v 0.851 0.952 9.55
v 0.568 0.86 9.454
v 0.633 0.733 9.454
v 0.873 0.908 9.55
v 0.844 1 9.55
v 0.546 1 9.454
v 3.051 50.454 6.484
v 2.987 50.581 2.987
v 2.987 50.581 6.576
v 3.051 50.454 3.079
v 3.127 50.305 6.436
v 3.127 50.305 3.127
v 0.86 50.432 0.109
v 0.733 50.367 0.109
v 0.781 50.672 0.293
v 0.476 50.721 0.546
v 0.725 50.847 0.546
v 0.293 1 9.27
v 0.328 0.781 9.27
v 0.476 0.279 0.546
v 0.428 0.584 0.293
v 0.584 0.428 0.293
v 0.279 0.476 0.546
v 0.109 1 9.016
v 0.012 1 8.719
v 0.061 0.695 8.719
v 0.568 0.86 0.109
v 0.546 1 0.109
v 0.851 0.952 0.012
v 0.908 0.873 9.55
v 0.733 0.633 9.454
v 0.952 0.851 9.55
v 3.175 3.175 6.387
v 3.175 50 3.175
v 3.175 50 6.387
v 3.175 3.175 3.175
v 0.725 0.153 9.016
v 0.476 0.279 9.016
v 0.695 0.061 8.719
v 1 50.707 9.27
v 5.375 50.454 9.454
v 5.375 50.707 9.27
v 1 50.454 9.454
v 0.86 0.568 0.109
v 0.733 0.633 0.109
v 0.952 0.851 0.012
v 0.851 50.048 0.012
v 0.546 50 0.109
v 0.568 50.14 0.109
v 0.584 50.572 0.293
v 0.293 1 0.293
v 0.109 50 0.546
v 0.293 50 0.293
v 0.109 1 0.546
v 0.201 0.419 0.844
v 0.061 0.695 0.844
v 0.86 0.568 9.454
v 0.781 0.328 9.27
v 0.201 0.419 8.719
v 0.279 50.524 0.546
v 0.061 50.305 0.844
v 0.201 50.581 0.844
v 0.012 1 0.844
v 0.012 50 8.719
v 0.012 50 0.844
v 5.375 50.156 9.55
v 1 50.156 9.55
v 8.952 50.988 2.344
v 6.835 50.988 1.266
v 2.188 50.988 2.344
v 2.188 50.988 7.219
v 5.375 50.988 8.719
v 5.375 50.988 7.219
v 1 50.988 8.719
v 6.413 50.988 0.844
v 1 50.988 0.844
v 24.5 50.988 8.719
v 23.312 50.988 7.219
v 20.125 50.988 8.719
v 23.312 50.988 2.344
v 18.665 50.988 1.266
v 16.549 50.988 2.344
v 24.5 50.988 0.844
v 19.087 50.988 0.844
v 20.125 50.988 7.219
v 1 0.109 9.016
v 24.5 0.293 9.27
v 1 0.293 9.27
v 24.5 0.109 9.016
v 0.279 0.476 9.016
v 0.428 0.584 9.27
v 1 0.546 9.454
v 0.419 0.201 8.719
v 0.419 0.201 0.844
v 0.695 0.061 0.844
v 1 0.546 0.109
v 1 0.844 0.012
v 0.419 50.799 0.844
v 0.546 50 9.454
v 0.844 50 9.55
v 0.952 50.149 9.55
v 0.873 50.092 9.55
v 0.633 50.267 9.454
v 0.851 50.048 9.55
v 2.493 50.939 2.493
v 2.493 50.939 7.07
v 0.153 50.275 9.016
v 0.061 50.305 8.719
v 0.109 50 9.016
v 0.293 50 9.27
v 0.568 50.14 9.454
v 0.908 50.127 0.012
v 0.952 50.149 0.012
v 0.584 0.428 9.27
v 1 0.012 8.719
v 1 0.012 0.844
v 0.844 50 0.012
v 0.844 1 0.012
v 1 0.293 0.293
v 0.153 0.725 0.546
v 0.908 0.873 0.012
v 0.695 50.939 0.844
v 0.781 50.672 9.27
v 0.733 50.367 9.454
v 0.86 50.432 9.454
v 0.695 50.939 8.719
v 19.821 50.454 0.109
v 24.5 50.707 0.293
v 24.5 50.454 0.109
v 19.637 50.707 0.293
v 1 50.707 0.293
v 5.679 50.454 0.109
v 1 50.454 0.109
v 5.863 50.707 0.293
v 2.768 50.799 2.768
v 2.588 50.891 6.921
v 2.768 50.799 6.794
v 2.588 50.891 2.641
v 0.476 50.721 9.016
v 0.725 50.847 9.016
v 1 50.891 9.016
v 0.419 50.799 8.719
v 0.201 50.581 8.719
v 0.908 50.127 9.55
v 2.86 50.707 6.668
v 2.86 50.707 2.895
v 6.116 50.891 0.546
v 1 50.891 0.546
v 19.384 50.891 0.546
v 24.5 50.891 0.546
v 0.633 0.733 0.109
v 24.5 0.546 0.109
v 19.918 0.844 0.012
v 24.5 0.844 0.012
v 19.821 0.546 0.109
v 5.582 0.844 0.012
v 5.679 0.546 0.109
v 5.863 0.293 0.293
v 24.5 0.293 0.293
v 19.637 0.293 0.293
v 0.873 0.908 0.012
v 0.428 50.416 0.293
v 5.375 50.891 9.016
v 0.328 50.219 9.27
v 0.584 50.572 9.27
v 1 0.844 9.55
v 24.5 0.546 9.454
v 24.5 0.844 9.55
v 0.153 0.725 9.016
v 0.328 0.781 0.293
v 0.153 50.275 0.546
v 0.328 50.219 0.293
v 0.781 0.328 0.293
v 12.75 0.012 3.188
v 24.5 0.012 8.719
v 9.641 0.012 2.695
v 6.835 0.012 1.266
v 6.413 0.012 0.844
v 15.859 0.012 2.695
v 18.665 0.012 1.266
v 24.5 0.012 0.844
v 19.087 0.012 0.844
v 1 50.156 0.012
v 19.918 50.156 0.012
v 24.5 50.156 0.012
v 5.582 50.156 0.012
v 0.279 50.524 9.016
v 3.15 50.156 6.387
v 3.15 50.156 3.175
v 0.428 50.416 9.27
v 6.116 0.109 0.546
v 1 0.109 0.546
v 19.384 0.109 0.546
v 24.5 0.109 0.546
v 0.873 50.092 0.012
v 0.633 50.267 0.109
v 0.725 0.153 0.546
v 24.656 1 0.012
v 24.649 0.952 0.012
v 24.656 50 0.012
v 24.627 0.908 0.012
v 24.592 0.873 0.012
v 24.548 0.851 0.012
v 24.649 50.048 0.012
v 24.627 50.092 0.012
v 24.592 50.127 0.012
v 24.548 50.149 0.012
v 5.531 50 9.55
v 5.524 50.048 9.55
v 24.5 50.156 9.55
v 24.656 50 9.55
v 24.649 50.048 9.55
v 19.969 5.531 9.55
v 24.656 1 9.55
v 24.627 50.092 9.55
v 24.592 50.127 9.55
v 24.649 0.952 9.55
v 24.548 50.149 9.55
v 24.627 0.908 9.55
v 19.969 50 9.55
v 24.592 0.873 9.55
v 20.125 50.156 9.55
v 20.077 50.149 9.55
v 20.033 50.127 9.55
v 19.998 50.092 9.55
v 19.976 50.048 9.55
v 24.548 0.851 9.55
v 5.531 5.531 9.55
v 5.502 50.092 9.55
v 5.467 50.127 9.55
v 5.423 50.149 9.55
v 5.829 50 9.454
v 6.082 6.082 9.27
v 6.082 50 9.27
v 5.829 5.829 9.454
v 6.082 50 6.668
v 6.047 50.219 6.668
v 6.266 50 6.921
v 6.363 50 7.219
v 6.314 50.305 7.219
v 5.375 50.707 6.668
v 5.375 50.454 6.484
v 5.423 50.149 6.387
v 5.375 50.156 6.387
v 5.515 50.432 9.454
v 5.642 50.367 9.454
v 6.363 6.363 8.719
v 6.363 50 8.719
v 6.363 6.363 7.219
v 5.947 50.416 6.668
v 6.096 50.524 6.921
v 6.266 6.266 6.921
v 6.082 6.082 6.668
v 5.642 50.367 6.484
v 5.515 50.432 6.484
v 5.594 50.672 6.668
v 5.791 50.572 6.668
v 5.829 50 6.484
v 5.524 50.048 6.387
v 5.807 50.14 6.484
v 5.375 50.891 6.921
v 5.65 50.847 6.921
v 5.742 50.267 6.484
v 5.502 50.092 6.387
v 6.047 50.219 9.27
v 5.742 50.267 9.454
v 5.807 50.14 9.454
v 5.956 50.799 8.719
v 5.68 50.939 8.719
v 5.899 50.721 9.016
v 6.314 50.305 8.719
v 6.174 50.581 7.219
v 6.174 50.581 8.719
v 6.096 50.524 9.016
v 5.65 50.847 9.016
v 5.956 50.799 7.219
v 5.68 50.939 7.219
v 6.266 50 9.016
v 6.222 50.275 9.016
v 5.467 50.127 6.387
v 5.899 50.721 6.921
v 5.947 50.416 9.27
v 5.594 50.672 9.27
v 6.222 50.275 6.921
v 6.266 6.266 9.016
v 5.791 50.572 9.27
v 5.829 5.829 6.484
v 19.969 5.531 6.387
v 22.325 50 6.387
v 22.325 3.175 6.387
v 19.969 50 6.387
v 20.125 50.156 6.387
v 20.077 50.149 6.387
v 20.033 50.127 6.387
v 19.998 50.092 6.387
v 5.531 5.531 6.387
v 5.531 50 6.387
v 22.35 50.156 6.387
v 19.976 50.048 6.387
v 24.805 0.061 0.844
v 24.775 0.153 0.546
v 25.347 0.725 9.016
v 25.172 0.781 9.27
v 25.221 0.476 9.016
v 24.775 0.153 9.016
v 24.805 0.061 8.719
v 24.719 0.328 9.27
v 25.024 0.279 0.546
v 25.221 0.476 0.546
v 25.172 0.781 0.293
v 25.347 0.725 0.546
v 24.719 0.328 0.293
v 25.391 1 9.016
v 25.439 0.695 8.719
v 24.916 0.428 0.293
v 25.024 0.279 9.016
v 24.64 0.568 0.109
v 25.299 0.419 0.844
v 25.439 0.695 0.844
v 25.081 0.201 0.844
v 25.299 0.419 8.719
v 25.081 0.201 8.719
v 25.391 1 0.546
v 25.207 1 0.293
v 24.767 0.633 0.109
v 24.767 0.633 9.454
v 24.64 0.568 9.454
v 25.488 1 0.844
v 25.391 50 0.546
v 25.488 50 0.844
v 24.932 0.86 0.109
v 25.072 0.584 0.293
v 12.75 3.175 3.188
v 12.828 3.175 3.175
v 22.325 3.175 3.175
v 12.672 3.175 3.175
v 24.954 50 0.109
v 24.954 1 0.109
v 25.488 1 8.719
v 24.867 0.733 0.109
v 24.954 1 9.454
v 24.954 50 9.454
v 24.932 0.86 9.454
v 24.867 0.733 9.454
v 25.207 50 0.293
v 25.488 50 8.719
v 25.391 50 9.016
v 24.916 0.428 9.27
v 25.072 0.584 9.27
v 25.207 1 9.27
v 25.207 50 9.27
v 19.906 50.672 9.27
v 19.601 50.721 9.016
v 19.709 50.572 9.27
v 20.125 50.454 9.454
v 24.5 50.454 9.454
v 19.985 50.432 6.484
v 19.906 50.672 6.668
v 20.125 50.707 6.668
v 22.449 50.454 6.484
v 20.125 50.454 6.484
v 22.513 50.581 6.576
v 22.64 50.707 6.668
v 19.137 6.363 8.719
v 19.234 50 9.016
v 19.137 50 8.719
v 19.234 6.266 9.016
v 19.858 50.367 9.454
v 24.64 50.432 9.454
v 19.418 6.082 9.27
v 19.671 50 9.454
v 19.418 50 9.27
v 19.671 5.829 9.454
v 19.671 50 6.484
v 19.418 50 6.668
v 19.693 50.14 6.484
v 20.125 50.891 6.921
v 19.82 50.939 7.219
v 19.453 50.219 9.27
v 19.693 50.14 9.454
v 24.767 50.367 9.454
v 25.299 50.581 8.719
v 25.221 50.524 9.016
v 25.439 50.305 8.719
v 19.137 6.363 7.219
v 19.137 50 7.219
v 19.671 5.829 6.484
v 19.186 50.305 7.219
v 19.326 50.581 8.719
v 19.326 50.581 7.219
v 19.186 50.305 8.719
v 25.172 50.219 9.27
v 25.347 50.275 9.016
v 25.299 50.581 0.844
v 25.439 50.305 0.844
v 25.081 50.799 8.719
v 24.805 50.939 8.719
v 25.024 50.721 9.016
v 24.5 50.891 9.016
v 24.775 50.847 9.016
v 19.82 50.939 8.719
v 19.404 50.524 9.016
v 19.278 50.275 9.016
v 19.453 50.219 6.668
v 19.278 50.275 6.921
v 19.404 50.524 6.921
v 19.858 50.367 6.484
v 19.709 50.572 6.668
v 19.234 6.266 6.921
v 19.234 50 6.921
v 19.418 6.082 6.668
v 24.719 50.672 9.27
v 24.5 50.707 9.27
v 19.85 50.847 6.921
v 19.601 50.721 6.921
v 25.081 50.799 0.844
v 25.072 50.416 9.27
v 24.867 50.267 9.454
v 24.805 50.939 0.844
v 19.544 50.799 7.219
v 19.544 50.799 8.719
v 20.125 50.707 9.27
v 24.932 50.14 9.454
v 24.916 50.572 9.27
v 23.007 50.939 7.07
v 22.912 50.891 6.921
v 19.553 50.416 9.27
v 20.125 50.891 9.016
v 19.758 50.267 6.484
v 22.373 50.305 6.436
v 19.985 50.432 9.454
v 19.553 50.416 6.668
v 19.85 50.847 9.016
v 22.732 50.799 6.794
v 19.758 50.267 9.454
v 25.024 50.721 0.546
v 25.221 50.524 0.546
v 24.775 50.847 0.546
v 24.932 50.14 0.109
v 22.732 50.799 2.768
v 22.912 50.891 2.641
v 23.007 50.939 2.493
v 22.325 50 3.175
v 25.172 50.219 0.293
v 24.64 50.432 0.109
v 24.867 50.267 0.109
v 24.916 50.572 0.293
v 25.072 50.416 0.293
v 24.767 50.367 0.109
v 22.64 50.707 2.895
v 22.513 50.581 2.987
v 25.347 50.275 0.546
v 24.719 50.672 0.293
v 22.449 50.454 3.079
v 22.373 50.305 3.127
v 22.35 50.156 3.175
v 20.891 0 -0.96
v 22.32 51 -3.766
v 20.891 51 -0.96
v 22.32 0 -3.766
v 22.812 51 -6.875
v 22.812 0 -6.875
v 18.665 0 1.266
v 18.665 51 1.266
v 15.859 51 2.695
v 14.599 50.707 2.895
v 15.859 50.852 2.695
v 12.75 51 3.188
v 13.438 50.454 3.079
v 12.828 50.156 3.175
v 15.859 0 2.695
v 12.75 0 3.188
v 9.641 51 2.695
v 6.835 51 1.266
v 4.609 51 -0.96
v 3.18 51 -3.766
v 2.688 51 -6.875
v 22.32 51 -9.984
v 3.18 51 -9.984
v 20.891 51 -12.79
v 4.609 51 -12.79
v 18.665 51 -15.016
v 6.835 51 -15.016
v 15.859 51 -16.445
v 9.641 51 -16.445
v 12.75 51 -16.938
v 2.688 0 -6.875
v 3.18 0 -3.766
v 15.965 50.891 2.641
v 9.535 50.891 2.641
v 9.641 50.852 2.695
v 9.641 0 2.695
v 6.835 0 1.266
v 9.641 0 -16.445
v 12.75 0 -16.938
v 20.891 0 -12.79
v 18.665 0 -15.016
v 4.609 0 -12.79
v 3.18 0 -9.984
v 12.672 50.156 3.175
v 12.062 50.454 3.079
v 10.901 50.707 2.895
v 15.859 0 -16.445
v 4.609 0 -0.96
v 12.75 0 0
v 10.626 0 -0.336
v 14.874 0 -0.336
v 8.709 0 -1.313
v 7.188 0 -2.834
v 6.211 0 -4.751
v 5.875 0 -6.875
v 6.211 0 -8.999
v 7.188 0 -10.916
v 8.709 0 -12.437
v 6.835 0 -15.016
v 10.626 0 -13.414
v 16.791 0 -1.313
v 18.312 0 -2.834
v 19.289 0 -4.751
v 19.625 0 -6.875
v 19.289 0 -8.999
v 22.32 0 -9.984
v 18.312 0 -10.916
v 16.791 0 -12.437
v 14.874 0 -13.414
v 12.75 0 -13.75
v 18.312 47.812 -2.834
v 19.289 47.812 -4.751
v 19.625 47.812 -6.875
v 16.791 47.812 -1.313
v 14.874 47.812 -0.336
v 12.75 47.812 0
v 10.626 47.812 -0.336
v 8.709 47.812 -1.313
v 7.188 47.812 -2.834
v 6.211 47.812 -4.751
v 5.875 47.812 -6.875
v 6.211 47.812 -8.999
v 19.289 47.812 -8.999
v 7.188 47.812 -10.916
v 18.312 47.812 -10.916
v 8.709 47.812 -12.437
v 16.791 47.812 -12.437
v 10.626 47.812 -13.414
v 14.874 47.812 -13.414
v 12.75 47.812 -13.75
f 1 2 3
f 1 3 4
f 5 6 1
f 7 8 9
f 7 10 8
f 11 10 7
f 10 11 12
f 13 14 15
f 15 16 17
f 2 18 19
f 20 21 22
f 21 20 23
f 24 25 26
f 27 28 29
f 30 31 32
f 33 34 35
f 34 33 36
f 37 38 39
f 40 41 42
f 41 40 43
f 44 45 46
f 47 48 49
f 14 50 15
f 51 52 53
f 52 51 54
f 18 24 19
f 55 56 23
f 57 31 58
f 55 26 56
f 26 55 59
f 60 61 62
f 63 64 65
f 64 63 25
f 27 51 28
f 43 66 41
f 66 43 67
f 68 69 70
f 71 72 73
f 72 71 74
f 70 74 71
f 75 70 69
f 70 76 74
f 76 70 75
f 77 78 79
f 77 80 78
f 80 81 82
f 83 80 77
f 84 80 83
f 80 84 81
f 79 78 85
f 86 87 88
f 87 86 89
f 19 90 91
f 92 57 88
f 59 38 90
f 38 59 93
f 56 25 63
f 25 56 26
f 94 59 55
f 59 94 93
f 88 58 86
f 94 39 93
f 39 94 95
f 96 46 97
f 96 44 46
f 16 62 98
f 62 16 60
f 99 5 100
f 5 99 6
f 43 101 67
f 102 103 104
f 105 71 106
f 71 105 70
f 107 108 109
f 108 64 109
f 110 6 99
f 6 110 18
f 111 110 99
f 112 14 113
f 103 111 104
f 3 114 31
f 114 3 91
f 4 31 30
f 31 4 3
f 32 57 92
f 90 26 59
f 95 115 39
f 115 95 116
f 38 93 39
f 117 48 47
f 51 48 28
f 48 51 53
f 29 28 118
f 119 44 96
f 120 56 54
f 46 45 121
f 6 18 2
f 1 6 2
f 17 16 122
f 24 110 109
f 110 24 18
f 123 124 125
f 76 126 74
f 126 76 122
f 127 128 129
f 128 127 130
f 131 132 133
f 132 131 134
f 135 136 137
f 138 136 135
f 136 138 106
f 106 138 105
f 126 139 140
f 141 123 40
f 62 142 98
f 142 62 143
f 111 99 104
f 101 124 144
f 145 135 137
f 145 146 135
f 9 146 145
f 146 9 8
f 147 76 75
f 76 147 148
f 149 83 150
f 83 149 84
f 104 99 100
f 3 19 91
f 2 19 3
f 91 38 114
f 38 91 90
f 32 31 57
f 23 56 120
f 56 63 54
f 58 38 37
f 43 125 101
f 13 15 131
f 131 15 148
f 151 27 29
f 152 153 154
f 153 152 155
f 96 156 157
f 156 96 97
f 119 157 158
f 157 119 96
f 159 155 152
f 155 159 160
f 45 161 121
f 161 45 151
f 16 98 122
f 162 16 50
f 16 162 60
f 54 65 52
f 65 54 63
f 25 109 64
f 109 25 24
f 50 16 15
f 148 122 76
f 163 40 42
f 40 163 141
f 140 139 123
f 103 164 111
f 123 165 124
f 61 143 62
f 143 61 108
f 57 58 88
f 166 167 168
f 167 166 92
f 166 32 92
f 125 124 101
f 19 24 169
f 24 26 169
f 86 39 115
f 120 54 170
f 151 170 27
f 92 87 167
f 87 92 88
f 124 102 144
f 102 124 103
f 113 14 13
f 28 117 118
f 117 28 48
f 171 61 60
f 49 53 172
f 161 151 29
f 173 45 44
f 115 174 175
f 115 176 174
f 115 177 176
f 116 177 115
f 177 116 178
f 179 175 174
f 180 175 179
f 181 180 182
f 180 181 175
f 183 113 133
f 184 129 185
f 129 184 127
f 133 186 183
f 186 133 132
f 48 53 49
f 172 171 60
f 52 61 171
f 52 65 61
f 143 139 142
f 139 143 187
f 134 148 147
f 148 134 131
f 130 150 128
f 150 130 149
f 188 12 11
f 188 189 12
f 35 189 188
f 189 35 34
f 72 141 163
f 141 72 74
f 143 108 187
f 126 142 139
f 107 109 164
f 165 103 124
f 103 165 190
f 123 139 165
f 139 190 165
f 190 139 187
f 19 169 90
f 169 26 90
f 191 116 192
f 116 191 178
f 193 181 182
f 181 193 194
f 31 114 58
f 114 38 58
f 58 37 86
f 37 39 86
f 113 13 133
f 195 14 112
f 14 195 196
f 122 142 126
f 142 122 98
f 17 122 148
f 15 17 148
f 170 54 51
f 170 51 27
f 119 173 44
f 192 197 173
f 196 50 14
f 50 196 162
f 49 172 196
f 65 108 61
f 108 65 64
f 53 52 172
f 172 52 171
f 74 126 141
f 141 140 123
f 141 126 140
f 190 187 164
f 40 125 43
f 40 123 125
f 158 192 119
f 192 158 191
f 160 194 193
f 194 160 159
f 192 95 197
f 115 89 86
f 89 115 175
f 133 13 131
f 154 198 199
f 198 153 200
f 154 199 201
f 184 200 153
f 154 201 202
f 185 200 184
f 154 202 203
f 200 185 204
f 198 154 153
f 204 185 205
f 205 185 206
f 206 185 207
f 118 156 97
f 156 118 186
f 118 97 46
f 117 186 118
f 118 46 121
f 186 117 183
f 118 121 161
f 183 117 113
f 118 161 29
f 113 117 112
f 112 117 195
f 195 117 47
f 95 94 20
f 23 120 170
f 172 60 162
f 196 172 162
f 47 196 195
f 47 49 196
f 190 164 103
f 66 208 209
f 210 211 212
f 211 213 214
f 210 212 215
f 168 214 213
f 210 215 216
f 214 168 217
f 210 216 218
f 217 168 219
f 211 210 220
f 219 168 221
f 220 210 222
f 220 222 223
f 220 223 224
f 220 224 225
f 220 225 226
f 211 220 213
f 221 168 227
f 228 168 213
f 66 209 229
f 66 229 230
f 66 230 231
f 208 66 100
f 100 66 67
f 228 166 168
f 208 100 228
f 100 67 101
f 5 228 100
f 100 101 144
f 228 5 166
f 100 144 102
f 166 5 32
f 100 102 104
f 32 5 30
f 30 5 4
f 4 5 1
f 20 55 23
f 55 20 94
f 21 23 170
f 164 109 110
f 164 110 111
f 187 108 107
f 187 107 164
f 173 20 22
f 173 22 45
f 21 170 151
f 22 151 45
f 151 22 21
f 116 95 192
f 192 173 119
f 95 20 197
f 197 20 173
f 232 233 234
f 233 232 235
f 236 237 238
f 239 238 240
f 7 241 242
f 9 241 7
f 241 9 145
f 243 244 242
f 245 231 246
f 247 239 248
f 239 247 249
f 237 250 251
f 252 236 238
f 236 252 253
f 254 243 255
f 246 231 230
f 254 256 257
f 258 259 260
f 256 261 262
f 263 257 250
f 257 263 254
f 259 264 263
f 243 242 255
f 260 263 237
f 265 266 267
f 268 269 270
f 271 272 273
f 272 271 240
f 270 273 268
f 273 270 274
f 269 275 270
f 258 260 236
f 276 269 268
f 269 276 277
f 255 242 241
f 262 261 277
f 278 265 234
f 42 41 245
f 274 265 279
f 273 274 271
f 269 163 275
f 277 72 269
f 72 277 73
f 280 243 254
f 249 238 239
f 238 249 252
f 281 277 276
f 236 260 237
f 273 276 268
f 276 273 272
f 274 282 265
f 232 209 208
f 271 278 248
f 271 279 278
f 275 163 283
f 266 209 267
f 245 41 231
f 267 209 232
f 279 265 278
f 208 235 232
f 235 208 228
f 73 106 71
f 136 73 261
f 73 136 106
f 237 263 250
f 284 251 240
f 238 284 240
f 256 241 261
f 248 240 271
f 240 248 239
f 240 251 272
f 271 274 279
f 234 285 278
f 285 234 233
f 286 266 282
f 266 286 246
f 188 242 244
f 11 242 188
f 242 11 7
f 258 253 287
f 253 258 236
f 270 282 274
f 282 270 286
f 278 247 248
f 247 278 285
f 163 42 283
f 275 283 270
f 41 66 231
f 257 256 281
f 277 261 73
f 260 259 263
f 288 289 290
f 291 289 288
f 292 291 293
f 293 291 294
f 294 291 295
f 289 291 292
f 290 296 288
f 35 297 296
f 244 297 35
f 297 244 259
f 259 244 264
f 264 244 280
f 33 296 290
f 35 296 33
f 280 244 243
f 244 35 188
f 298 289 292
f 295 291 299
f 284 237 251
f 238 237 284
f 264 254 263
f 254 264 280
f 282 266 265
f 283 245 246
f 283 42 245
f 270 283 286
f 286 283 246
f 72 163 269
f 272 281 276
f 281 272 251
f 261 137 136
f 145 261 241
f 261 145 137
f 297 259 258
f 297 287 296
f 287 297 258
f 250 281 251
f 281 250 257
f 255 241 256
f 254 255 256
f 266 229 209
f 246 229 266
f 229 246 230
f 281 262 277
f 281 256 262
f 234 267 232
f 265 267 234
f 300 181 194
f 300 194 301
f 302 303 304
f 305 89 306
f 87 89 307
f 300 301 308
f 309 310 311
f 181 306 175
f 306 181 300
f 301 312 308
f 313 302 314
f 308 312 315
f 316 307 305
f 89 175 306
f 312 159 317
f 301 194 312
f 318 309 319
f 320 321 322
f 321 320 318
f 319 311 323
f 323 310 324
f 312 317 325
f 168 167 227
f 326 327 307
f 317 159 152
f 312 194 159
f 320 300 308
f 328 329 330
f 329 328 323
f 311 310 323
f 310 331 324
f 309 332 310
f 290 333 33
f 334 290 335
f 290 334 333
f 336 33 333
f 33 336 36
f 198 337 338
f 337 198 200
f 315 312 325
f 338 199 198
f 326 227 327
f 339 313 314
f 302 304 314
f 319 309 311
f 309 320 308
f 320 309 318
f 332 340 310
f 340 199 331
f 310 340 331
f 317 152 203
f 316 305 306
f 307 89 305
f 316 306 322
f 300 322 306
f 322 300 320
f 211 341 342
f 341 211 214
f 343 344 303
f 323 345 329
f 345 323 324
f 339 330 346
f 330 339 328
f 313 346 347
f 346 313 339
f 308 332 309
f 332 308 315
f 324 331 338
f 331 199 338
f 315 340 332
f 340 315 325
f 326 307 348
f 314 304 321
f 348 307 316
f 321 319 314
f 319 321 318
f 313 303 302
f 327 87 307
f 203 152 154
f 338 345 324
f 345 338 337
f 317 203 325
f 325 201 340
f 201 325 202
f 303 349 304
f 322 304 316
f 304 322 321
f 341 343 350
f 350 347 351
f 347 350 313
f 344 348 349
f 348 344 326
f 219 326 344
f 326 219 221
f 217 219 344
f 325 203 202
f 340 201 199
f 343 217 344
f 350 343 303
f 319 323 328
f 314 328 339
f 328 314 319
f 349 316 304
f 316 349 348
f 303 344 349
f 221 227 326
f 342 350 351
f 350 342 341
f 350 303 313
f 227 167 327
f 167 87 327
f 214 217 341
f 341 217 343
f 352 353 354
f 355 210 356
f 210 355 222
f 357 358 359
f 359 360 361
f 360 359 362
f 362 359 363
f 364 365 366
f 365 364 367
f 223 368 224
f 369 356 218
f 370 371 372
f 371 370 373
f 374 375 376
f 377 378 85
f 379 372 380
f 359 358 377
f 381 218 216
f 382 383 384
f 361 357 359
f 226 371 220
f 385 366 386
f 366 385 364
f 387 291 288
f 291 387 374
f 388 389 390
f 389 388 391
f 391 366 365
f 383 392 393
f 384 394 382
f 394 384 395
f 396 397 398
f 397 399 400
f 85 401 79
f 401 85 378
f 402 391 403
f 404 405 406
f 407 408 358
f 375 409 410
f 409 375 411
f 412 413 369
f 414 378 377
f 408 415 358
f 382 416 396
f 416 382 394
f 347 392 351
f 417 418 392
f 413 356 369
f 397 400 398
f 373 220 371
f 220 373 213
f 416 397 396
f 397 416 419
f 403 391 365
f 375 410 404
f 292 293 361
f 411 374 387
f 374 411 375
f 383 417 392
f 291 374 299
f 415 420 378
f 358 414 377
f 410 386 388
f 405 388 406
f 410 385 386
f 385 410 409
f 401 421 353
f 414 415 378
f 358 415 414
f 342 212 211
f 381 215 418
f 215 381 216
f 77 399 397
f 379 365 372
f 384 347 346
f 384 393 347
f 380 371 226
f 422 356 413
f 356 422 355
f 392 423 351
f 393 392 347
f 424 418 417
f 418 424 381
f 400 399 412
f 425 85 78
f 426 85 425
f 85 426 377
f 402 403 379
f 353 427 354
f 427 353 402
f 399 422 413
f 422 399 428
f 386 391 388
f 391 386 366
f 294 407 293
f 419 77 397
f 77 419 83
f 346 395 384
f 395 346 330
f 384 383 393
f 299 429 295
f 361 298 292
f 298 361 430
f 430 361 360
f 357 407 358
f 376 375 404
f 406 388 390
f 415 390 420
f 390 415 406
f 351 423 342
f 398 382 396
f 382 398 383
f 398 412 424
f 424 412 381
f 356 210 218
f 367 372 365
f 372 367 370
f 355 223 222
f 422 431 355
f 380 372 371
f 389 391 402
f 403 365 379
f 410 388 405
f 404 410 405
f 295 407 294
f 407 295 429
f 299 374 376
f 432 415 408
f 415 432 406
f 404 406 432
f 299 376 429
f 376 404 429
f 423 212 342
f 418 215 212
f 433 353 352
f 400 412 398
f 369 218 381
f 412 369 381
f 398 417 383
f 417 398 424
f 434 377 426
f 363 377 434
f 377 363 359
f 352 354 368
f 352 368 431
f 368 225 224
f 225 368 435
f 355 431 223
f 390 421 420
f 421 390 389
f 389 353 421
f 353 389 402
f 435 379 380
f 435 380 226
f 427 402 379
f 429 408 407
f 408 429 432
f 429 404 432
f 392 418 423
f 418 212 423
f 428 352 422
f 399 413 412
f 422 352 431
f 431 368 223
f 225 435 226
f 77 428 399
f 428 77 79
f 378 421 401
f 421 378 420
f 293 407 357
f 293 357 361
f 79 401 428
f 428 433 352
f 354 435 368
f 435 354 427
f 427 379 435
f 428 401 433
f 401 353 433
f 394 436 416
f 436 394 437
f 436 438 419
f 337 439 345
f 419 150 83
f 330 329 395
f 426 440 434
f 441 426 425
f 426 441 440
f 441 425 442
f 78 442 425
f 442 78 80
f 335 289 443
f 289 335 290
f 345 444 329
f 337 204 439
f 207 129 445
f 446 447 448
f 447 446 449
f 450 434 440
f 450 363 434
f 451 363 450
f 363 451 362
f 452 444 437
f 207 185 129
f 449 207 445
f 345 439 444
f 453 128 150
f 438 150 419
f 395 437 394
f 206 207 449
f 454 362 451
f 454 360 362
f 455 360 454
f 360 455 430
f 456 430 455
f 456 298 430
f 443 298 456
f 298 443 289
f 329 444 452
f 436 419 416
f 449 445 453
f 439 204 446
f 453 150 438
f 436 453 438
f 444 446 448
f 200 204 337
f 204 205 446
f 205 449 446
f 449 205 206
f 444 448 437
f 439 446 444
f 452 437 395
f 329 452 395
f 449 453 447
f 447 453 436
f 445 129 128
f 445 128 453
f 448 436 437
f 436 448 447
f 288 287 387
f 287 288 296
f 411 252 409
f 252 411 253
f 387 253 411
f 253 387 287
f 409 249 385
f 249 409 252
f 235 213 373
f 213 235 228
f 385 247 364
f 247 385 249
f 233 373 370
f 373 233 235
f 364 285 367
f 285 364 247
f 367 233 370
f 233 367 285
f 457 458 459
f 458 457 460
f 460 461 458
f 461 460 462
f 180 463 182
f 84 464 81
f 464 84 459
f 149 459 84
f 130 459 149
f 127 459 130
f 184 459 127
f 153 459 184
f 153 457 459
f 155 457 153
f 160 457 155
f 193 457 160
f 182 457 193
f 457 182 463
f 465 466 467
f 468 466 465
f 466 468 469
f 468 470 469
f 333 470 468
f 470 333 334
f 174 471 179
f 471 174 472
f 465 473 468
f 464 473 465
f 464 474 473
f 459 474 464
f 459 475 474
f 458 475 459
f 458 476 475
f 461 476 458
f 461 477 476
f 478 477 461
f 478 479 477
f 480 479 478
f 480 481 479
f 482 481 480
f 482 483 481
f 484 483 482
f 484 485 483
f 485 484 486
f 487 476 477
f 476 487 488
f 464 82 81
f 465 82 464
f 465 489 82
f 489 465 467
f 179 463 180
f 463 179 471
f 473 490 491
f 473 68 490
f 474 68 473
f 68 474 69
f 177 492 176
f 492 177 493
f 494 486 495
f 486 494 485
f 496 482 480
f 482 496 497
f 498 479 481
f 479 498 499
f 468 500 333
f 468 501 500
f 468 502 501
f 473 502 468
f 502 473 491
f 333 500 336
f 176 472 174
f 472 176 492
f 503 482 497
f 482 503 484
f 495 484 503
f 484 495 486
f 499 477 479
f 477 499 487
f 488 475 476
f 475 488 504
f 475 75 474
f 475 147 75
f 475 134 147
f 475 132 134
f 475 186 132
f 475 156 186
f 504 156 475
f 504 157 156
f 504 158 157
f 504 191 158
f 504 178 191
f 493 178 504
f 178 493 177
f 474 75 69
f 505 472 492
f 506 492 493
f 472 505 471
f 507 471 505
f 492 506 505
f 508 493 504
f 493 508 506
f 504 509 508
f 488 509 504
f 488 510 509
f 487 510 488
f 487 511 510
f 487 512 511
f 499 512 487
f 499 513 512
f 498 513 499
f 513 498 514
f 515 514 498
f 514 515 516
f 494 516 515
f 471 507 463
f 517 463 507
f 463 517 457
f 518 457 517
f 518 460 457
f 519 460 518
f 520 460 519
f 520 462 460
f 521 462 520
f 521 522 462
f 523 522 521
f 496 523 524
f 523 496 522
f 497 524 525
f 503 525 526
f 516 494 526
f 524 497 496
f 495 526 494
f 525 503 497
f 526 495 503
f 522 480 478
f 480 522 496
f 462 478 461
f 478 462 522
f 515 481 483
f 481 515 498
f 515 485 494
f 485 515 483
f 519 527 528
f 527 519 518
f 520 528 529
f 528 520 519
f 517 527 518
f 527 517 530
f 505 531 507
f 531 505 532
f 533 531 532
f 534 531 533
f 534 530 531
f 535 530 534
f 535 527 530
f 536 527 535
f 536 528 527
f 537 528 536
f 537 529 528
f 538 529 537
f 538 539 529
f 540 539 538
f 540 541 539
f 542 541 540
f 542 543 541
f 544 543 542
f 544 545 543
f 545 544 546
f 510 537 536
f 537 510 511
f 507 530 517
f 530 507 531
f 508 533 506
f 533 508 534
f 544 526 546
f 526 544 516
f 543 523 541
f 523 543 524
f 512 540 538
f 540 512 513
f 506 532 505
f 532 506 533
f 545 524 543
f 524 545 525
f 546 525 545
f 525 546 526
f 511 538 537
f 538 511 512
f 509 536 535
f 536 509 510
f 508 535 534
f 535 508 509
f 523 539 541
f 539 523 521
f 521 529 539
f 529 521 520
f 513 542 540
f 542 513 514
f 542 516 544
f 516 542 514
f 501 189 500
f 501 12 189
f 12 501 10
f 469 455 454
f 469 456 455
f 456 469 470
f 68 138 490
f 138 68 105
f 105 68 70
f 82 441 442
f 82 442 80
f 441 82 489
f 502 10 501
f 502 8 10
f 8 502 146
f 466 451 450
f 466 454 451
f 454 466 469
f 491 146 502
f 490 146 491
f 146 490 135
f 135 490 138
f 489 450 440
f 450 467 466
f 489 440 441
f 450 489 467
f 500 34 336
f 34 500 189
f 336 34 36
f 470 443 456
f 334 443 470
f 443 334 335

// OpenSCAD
//fine = true; 
fine = false; 

$fn = fine ? 100 : 20;

roundcorner = 2; 

horn_arc = 45;

horn_diameter = 5;

base_size = 25.5;
plate_thickness = base_size / 8;


module pad() {
    color("orange") 
    translate([((base_size / 8) * 2) + (roundcorner / 2), ((base_size / 8) * 2) + (roundcorner / 2), roundcorner / 2]) {
        minkowski() {
            cube([((base_size / 8) * 4) - roundcorner, ((base_size / 8) * 4) - roundcorner, (2 * plate_thickness) - roundcorner]);
            sphere(d = roundcorner);
        }
    }



    translate([base_size / 2, base_size / 2, 2 * plate_thickness])

    translate([10, 0, 0]){
        color("green") rotate([90, 180 + 45, 0]) {
            rotate_extrude(angle=horn_arc) {
                translate([10, 0]) {
                    circle(d = horn_diameter);
                }
            }
            translate([10,0, 0]) {
                color("purple") sphere(d = horn_diameter);
            }
        }
    }

}


module base() {
    color("purple") 
    translate([((base_size / 8) * 1) + (roundcorner / 2), ((base_size / 8) * 1) + (roundcorner / 2), (roundcorner / 2)]) {
        minkowski() {
            cube([((base_size / 8) * 6) - roundcorner, ((base_size / 8) * 6) - roundcorner, plate_thickness - roundcorner]);
            sphere(d = roundcorner);
        }
    }
}
    
module plate() {
    color("red") 
    translate([((base_size / 8) * 0) + (roundcorner / 2), ((base_size / 8) * 0) + (roundcorner / 2), (roundcorner / 2)]) {
        minkowski() {
            cube([((base_size / 8) * 8) - roundcorner, ((base_size / 8) * 8) - roundcorner, plate_thickness - roundcorner]);
            sphere(d = roundcorner);
        }
    }
}
module plate2() {
    color("red") 
    translate([((base_size / 8) * 0) + (roundcorner / 2), ((base_size / 8) * 0) + (roundcorner / 2), (roundcorner / 2)]) {
        minkowski() {
            cube([((base_size / 8) * 8) - roundcorner, ((base_size / 8) * 8 * 2) - roundcorner, plate_thickness - roundcorner]);
            sphere(d = roundcorner);
        }
    }
}

module rail() {
    color("grey") translate([((base_size / 8) * 0) + (roundcorner / 2), ((base_size / 8) * 0) + (roundcorner / 2), (roundcorner / 2)]) {
        minkowski() {
            cube([((base_size / 8) * 1) - roundcorner, ((base_size / 8) * 8) - roundcorner, (plate_thickness * 3) - roundcorner]);
            sphere(d = roundcorner);
        }
    }
    color("orange") translate([((base_size / 8) * 0) + (roundcorner / 2), ((base_size / 8) * 0) + (roundcorner / 2), (plate_thickness * 2)+ (roundcorner / 2)]) {
        minkowski() {
            cube([((base_size / 8) * 2) - roundcorner, ((base_size / 8) * 8) - roundcorner, (plate_thickness * 1) - roundcorner]);
            sphere(d = roundcorner);
        }
    }
    
    
    color("grey") translate([((base_size / 8) * 0) + (roundcorner / 2), ((base_size / 8) * 0) + (roundcorner / 2), (roundcorner / 2)]) {
        minkowski() {
            cube([((base_size / 8) * 8) - roundcorner, ((base_size / 8) * 1) - roundcorner, (plate_thickness * 3) - roundcorner]);
            sphere(d = roundcorner);
        }
    }
    color("orange") translate([((base_size / 8) * 6) + (roundcorner / 2), ((base_size / 8) * 0) + (roundcorner / 2), (plate_thickness * 2) + (roundcorner / 2)]) {
        minkowski() {
            cube([((base_size / 8) * 2) - roundcorner, ((base_size / 8) * 8) - roundcorner, (plate_thickness * 1) - roundcorner]);
            sphere(d = roundcorner);
        }
    }
    
    
    
    color("grey") translate([((base_size / 8) * 7) + (roundcorner / 2), ((base_size / 8) * 0) + (roundcorner / 2), (roundcorner / 2)]) {
        minkowski() {
            cube([((base_size / 8) * 1) - roundcorner, ((base_size / 8) * 8) - roundcorner, (plate_thickness * 3) - roundcorner]);
            sphere(d = roundcorner);
        }
    }
        color("orange") translate([((base_size / 8) * 0) + (roundcorner / 2), ((base_size / 8) * 0) + (roundcorner / 2), (plate_thickness * 2) + (roundcorner / 2)]) {
        minkowski() {
            cube([((base_size / 8) * 8) - roundcorner, ((base_size / 8) * 2) - roundcorner, (plate_thickness * 1) - roundcorner]);
            sphere(d = roundcorner);
        }
    }
}



module rail2() {
    color("grey") translate([((base_size / 8) * 0) + (roundcorner / 2), ((base_size / 8) * 0) + (roundcorner / 2), (roundcorner / 2)]) {
        minkowski() {
            cube([((base_size / 8) * 1) - roundcorner, ((base_size / 8) * 8 *2) - roundcorner, (plate_thickness * 3) - roundcorner]);
            sphere(d = roundcorner);
        }
    }
    color("orange") translate([((base_size / 8) * 0) + (roundcorner / 2), ((base_size / 8) * 0) + (roundcorner / 2), (plate_thickness * 2)+ (roundcorner / 2)]) {
        minkowski() {
            cube([((base_size / 8) * 2) - roundcorner, ((base_size / 8) * 8 * 2) - roundcorner, (plate_thickness * 1) - roundcorner]);
            sphere(d = roundcorner);
        }
    }
    
    
    color("grey") translate([((base_size / 8) * 0) + (roundcorner / 2), ((base_size / 8) * 0) + (roundcorner / 2), (roundcorner / 2)]) {
        minkowski() {
            cube([((base_size / 8) * 8) - roundcorner, ((base_size / 8) * 1) - roundcorner, (plate_thickness * 3) - roundcorner]);
            sphere(d = roundcorner);
        }
    }
    color("orange") translate([((base_size / 8) * 6) + (roundcorner / 2), ((base_size / 8) * 0) + (roundcorner / 2), (plate_thickness * 2) + (roundcorner / 2)]) {
        minkowski() {
            cube([((base_size / 8) * 2) - roundcorner, ((base_size / 8) * 8 * 2) - roundcorner, (plate_thickness * 1) - roundcorner]);
            sphere(d = roundcorner);
        }
    }
    
    
    
    color("grey") translate([((base_size / 8) * 7) + (roundcorner / 2), ((base_size / 8) * 0) + (roundcorner / 2), (roundcorner / 2)]) {
        minkowski() {
            cube([((base_size / 8) * 1) - roundcorner, ((base_size / 8) * 8 * 2) - roundcorner, (plate_thickness * 3) - roundcorner]);
            sphere(d = roundcorner);
        }
    }
        color("orange") translate([((base_size / 8) * 0) + (roundcorner / 2), ((base_size / 8) * 0) + (roundcorner / 2), (plate_thickness * 2) + (roundcorner / 2)]) {
        minkowski() {
            cube([((base_size / 8) * 8) - roundcorner, ((base_size / 8) * 2) - roundcorner, (plate_thickness * 1) - roundcorner]);
            sphere(d = roundcorner);
        }
    }
}




module base3() {
    color("blue") hull() {
        base();
        translate([0, base_size, 0]) base();
    }
}

//pad();
//translate([0, base_size, 0]) pad();
//base2();
//base3();

plate2();
rail2();

tube_id = (base_size / 2) + 1;
tube_od = tube_id + (plate_thickness * 2);

translate([base_size / 2, base_size * 2, - ((tube_od / 2) - plate_thickness)] ) {
    rotate([90, 0, 0]) {
difference() {
        cylinder(d = tube_od, h = base_size * 2);
        translate([0, 0, plate_thickness + 0.001])
        cylinder(d = tube_id, h = (base_size * 2) - plate_thickness);
}
    }
}
